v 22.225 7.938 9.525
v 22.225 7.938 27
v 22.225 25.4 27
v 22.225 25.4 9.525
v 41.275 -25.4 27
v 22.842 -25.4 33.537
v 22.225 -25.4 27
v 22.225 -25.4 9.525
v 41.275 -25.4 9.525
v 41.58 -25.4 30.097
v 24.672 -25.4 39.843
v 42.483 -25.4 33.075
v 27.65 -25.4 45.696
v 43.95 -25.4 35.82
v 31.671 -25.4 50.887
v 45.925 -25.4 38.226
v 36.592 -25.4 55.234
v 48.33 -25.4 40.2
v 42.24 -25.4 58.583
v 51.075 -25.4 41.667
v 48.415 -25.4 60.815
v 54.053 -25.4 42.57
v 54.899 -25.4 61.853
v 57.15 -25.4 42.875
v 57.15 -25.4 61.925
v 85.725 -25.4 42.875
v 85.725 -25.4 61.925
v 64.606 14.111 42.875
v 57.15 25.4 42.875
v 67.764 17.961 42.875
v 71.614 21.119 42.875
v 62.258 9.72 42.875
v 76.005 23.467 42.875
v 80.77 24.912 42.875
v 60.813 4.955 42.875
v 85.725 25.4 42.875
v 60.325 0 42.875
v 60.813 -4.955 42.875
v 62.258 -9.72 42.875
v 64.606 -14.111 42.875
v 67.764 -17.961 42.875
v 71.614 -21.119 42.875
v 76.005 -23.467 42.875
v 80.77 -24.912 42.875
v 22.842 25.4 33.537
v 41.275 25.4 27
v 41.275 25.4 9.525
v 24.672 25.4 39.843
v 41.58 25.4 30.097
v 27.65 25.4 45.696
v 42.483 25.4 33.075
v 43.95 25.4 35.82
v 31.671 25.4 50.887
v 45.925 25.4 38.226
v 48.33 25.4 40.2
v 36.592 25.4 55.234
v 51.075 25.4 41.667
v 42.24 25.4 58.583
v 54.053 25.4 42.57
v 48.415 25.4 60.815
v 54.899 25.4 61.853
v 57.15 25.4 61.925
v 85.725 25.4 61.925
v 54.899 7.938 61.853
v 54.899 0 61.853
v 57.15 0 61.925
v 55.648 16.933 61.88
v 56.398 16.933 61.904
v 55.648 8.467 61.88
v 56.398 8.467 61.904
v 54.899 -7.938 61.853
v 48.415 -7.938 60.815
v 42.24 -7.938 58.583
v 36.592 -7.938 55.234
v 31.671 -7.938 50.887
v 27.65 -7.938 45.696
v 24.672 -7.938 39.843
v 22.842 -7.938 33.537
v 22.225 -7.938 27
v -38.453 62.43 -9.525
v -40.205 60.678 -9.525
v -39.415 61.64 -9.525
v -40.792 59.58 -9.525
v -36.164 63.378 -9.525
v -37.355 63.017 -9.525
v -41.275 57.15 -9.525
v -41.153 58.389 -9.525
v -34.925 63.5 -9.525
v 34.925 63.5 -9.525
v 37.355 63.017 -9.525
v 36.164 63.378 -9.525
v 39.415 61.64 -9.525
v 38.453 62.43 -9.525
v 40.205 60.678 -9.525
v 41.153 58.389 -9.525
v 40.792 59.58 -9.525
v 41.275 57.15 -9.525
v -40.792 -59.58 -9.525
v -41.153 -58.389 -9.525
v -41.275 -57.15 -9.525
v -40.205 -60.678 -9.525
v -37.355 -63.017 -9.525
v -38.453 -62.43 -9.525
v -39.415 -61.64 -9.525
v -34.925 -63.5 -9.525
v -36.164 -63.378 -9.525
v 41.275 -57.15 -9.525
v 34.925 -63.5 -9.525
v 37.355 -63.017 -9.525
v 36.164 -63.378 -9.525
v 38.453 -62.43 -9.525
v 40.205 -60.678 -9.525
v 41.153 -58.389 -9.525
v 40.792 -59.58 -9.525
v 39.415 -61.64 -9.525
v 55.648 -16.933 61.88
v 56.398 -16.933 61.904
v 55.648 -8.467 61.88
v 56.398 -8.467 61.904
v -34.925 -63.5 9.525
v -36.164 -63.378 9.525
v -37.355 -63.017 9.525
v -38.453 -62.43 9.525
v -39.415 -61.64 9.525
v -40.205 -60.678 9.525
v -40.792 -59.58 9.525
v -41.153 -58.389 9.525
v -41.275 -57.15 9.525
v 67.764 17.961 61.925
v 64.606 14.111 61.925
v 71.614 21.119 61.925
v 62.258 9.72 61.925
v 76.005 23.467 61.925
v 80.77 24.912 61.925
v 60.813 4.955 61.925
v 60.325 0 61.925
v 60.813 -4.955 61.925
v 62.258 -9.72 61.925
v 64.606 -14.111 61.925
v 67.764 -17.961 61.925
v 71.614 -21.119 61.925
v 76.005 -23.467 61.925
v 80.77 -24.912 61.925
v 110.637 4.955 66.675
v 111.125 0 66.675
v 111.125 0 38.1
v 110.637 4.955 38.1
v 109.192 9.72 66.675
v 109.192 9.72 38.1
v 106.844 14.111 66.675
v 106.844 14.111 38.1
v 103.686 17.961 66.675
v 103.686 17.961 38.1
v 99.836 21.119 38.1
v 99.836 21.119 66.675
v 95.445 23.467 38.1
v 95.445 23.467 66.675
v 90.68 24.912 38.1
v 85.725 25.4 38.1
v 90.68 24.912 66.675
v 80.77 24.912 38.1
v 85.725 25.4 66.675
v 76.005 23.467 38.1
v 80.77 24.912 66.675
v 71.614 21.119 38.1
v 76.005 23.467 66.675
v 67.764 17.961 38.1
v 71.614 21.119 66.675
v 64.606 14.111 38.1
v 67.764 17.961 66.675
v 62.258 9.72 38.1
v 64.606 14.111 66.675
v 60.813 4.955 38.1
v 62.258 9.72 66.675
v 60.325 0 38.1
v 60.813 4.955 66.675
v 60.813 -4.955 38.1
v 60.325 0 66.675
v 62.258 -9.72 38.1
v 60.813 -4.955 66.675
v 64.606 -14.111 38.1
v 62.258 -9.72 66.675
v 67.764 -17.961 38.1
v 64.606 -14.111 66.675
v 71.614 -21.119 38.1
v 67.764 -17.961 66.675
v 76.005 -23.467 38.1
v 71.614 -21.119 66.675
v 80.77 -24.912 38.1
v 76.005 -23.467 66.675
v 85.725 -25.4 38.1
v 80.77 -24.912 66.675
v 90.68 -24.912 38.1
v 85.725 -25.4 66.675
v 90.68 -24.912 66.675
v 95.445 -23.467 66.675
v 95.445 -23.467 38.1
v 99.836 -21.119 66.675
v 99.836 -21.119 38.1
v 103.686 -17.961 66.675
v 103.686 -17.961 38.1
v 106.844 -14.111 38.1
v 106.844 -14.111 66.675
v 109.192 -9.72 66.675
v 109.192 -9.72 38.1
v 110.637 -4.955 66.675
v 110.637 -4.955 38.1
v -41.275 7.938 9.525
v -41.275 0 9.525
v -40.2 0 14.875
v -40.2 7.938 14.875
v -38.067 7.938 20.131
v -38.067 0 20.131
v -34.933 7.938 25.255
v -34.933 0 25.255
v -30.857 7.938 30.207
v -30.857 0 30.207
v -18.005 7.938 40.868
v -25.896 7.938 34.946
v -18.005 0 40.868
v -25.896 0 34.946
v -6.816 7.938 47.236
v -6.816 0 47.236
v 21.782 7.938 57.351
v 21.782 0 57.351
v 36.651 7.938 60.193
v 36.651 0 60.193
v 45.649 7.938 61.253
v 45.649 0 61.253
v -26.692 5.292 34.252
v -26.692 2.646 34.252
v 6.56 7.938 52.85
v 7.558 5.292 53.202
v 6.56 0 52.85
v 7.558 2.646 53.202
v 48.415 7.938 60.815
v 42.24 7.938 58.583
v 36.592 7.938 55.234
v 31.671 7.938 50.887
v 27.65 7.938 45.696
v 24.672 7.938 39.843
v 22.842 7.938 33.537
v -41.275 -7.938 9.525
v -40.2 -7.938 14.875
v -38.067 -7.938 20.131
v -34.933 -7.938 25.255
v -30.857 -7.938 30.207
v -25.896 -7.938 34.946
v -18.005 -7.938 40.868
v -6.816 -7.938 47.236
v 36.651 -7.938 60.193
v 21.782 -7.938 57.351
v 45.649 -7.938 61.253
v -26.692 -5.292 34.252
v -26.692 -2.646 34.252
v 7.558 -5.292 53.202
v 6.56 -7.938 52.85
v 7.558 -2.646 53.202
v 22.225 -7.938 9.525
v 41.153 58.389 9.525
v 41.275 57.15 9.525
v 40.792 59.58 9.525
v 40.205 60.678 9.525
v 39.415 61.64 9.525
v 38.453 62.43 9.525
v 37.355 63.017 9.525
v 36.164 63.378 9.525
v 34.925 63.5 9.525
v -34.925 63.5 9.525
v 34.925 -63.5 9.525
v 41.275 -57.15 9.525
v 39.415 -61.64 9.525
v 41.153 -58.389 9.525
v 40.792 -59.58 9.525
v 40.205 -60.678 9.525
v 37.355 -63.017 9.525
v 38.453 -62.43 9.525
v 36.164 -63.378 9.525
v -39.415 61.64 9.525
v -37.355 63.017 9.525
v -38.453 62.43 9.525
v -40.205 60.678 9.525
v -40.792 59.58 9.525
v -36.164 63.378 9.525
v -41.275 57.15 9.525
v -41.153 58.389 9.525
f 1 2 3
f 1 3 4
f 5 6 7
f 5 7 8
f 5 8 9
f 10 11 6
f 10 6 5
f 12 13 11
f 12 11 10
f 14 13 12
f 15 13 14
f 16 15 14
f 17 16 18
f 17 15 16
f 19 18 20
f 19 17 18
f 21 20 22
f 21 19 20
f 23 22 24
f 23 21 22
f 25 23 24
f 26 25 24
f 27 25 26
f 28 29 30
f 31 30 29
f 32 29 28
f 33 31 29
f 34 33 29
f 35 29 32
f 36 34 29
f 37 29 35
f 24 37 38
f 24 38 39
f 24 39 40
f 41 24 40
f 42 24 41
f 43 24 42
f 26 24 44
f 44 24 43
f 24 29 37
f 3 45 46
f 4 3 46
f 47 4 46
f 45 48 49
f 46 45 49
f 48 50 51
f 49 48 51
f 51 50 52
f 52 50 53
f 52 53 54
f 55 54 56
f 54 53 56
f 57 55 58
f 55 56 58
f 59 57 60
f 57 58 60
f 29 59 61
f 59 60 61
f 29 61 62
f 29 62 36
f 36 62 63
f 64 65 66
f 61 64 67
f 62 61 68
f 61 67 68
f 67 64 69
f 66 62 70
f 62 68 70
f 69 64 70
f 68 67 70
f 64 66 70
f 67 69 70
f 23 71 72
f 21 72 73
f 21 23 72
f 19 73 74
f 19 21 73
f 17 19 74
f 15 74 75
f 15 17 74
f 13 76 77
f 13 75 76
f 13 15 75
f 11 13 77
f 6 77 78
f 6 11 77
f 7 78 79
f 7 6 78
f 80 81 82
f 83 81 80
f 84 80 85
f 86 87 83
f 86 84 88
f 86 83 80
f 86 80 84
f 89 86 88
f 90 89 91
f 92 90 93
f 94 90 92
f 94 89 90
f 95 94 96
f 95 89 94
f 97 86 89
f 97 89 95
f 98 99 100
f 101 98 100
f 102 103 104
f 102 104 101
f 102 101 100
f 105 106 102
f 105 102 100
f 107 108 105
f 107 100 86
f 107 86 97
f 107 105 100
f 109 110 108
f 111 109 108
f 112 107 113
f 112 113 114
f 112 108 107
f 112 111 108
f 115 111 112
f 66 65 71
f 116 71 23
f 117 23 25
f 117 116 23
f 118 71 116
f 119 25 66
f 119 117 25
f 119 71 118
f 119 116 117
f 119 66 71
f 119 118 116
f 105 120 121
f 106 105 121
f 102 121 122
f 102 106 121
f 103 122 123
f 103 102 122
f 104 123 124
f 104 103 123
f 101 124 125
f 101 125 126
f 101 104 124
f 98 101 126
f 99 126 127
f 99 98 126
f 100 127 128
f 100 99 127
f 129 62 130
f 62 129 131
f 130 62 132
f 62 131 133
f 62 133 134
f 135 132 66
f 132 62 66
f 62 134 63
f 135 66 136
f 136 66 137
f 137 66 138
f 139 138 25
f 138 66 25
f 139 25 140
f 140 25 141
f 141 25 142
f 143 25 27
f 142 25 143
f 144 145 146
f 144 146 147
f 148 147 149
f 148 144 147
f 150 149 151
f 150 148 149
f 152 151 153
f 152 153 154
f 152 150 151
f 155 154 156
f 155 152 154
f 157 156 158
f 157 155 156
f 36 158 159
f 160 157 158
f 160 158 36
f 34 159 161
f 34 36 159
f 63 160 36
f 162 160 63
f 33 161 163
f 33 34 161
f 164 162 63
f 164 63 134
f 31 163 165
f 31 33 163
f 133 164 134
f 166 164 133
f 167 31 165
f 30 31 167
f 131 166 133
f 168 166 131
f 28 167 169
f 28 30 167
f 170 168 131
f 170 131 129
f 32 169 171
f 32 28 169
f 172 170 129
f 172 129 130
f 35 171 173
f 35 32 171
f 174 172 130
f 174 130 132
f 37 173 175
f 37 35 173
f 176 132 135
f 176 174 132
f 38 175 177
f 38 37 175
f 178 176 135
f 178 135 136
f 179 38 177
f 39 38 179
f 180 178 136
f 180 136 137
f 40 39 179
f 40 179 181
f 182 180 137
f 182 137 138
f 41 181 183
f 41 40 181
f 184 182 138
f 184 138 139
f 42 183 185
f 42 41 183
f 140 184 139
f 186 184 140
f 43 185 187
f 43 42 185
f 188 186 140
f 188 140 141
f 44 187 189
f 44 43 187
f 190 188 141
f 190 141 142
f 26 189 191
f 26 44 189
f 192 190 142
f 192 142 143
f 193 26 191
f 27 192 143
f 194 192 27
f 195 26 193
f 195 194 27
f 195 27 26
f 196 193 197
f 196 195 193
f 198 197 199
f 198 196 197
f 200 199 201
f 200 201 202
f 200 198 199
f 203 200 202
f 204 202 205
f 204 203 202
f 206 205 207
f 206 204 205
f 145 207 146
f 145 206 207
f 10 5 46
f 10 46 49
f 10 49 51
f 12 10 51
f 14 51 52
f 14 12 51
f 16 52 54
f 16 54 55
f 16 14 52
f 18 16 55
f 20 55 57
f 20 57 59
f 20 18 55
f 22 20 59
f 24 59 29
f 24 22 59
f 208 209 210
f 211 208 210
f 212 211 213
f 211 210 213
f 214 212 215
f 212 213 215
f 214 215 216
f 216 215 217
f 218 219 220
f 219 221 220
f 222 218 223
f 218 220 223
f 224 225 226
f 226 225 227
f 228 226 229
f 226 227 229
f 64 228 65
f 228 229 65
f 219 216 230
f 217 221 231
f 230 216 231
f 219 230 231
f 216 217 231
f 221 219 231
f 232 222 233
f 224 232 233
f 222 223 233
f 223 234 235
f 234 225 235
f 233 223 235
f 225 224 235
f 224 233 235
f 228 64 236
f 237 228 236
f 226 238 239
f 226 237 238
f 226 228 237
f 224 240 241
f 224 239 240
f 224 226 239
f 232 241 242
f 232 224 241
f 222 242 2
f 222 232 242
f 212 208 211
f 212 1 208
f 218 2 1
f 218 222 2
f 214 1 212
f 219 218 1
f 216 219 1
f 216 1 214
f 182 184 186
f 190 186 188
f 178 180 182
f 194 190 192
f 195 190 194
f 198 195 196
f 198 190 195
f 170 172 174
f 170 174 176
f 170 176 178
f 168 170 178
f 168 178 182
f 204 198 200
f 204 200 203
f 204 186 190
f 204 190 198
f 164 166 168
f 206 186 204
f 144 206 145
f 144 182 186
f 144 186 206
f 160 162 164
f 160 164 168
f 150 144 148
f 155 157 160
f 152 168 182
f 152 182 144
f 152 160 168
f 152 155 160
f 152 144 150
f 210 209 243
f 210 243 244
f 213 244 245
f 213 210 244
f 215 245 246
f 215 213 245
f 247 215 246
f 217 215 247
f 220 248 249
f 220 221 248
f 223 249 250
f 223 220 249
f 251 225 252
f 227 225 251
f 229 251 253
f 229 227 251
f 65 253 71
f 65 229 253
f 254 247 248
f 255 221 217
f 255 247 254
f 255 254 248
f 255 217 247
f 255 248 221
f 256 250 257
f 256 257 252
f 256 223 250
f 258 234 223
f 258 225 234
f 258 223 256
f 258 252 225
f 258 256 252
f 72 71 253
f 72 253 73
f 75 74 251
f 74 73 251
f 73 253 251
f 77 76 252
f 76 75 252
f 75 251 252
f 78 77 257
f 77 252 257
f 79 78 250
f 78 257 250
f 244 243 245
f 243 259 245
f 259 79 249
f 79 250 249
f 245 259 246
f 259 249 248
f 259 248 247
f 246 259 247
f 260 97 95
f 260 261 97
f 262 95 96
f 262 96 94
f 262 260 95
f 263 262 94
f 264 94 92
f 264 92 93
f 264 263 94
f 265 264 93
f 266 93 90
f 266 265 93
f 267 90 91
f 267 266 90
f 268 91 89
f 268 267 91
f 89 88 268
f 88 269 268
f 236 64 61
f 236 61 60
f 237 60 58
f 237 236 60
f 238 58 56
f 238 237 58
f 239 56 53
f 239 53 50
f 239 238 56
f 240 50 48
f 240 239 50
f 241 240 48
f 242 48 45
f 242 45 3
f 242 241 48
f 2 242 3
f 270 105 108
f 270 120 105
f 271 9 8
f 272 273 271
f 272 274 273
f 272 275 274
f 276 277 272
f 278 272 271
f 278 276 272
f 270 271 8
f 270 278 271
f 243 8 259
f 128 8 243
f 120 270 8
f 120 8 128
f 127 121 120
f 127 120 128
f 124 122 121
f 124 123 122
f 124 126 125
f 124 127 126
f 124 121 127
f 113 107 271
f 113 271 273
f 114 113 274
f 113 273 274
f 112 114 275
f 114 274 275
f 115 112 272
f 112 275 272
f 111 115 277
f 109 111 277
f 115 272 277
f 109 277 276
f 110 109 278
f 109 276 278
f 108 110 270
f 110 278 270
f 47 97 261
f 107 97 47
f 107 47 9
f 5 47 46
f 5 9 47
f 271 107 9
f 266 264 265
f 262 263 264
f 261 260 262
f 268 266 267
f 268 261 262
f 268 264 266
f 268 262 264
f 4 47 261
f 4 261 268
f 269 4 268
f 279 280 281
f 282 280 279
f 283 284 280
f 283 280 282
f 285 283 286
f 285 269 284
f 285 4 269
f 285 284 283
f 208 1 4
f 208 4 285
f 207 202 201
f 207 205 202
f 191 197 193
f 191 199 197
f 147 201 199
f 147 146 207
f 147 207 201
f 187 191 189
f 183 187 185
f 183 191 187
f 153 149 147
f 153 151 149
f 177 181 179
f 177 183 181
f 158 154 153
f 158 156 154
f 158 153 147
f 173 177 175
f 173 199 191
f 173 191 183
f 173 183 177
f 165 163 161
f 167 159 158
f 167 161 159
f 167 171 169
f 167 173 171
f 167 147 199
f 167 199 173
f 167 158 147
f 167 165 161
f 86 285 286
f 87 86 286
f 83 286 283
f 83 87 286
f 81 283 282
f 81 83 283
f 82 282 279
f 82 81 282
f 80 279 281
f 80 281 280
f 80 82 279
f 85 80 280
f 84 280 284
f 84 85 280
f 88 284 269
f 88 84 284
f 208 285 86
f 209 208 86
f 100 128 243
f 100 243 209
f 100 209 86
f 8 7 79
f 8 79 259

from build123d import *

# Parameters (mm, degrees)
F1_DEPTH = 63.5
F2_DEPTH = 25.4
F0_W     = 25.4
F0_H     = 19.05
F3_DEPTH = 25.4
F4_DEPTH = 7.9375
F6_R     = 6.35


with BuildPart() as f1:
    # F0 (on Front) → F1 (new body, symmetric)
    with BuildSketch(Plane.XZ):
        Polygon((-41.275, -9.525), (41.275, -9.525), (41.275, 9.525), (22.225, 9.525), (-41.275, 9.525), align=None)
    extrude(amount=F1_DEPTH, both=True)

    # F0 (on Front) → F2 (join, symmetric)
    with BuildSketch(Plane.XZ):
        with BuildLine():
            Line((22.225, 9.525), (41.275, 9.525))
            Line((41.275, 9.525), (41.275, 27.0002))
            ThreePointArc((41.275, 27.0002), (45.9246798487, 38.2255201513), (57.15, 42.8752))
            Line((57.15, 42.8752), (60.325, 42.8752))
            Line((60.325, 42.8752), (60.325, 61.9252))
            Line((60.325, 61.9252), (57.15, 61.9252))
            add(Edge.make_bspline(
                [(54.8989749886, 61.8525817177), (55.6472993307, 61.8814662978), (56.3976709314, 61.9056929595), (57.15, 61.9252)],
                knots=[109.9134052924, 109.9134052924, 109.9134052924, 109.9134052924, 111.5045361635, 111.5045361635, 111.5045361635, 111.5045361635], degree=3))
            ThreePointArc((54.8989749886, 61.8525817177), (31.6708646779, 50.8867922274), (22.225, 27.0002))
            Line((22.225, 27.0002), (22.225, 9.525))
        make_face()
    extrude(amount=F2_DEPTH, both=True)

    # F0 (on Front) → F3 (join, symmetric)
    with BuildSketch(Plane.XZ):
        with Locations((73.025, 52.4002)):
            Rectangle(F0_W, F0_H)
    extrude(amount=F3_DEPTH, both=True)

    # F0 (on Front) → F4 (join, symmetric)
    with BuildSketch(Plane.XZ):
        with BuildLine():
            add(Edge.make_bspline(
                [(-41.275, 9.525), (-38.7184419076, 35.6349297133), (3.2056302131, 59.8572696967), (54.8989749886, 61.8525817177)],
                knots=[0, 0, 0, 0, 109.9134052924, 109.9134052924, 109.9134052924, 109.9134052924], degree=3))
            Line((-41.275, 9.525), (22.225, 9.525))
            Line((22.225, 9.525), (22.225, 27.0002))
            ThreePointArc((22.225, 27.0002), (31.6708646779, 50.8867922274), (54.8989749886, 61.8525817177))
        make_face()
    extrude(amount=F4_DEPTH, both=True)

    # F0 (on Front) → F5 (revolve)
    with BuildSketch(Plane.XZ):
        Polygon((85.725, 61.9252), (85.725, 42.8752), (85.725, 38.1), (111.125, 38.1), (111.125, 66.675), (85.725, 66.675), align=None)
    revolve(axis=Axis((85.725, 0, 52.3875), (0, 0, 1)))

    # F6
    f6_edges = [f1.edges().sort_by_distance(p)[0] for p in [
        (-41.275, -63.5, 0),
        (41.275, -63.5, 0),
        (41.275, 63.5, 0),
        (-41.275, 63.5, 0),
    ]]
    fillet(f6_edges, radius=F6_R)


solid = f1.part
